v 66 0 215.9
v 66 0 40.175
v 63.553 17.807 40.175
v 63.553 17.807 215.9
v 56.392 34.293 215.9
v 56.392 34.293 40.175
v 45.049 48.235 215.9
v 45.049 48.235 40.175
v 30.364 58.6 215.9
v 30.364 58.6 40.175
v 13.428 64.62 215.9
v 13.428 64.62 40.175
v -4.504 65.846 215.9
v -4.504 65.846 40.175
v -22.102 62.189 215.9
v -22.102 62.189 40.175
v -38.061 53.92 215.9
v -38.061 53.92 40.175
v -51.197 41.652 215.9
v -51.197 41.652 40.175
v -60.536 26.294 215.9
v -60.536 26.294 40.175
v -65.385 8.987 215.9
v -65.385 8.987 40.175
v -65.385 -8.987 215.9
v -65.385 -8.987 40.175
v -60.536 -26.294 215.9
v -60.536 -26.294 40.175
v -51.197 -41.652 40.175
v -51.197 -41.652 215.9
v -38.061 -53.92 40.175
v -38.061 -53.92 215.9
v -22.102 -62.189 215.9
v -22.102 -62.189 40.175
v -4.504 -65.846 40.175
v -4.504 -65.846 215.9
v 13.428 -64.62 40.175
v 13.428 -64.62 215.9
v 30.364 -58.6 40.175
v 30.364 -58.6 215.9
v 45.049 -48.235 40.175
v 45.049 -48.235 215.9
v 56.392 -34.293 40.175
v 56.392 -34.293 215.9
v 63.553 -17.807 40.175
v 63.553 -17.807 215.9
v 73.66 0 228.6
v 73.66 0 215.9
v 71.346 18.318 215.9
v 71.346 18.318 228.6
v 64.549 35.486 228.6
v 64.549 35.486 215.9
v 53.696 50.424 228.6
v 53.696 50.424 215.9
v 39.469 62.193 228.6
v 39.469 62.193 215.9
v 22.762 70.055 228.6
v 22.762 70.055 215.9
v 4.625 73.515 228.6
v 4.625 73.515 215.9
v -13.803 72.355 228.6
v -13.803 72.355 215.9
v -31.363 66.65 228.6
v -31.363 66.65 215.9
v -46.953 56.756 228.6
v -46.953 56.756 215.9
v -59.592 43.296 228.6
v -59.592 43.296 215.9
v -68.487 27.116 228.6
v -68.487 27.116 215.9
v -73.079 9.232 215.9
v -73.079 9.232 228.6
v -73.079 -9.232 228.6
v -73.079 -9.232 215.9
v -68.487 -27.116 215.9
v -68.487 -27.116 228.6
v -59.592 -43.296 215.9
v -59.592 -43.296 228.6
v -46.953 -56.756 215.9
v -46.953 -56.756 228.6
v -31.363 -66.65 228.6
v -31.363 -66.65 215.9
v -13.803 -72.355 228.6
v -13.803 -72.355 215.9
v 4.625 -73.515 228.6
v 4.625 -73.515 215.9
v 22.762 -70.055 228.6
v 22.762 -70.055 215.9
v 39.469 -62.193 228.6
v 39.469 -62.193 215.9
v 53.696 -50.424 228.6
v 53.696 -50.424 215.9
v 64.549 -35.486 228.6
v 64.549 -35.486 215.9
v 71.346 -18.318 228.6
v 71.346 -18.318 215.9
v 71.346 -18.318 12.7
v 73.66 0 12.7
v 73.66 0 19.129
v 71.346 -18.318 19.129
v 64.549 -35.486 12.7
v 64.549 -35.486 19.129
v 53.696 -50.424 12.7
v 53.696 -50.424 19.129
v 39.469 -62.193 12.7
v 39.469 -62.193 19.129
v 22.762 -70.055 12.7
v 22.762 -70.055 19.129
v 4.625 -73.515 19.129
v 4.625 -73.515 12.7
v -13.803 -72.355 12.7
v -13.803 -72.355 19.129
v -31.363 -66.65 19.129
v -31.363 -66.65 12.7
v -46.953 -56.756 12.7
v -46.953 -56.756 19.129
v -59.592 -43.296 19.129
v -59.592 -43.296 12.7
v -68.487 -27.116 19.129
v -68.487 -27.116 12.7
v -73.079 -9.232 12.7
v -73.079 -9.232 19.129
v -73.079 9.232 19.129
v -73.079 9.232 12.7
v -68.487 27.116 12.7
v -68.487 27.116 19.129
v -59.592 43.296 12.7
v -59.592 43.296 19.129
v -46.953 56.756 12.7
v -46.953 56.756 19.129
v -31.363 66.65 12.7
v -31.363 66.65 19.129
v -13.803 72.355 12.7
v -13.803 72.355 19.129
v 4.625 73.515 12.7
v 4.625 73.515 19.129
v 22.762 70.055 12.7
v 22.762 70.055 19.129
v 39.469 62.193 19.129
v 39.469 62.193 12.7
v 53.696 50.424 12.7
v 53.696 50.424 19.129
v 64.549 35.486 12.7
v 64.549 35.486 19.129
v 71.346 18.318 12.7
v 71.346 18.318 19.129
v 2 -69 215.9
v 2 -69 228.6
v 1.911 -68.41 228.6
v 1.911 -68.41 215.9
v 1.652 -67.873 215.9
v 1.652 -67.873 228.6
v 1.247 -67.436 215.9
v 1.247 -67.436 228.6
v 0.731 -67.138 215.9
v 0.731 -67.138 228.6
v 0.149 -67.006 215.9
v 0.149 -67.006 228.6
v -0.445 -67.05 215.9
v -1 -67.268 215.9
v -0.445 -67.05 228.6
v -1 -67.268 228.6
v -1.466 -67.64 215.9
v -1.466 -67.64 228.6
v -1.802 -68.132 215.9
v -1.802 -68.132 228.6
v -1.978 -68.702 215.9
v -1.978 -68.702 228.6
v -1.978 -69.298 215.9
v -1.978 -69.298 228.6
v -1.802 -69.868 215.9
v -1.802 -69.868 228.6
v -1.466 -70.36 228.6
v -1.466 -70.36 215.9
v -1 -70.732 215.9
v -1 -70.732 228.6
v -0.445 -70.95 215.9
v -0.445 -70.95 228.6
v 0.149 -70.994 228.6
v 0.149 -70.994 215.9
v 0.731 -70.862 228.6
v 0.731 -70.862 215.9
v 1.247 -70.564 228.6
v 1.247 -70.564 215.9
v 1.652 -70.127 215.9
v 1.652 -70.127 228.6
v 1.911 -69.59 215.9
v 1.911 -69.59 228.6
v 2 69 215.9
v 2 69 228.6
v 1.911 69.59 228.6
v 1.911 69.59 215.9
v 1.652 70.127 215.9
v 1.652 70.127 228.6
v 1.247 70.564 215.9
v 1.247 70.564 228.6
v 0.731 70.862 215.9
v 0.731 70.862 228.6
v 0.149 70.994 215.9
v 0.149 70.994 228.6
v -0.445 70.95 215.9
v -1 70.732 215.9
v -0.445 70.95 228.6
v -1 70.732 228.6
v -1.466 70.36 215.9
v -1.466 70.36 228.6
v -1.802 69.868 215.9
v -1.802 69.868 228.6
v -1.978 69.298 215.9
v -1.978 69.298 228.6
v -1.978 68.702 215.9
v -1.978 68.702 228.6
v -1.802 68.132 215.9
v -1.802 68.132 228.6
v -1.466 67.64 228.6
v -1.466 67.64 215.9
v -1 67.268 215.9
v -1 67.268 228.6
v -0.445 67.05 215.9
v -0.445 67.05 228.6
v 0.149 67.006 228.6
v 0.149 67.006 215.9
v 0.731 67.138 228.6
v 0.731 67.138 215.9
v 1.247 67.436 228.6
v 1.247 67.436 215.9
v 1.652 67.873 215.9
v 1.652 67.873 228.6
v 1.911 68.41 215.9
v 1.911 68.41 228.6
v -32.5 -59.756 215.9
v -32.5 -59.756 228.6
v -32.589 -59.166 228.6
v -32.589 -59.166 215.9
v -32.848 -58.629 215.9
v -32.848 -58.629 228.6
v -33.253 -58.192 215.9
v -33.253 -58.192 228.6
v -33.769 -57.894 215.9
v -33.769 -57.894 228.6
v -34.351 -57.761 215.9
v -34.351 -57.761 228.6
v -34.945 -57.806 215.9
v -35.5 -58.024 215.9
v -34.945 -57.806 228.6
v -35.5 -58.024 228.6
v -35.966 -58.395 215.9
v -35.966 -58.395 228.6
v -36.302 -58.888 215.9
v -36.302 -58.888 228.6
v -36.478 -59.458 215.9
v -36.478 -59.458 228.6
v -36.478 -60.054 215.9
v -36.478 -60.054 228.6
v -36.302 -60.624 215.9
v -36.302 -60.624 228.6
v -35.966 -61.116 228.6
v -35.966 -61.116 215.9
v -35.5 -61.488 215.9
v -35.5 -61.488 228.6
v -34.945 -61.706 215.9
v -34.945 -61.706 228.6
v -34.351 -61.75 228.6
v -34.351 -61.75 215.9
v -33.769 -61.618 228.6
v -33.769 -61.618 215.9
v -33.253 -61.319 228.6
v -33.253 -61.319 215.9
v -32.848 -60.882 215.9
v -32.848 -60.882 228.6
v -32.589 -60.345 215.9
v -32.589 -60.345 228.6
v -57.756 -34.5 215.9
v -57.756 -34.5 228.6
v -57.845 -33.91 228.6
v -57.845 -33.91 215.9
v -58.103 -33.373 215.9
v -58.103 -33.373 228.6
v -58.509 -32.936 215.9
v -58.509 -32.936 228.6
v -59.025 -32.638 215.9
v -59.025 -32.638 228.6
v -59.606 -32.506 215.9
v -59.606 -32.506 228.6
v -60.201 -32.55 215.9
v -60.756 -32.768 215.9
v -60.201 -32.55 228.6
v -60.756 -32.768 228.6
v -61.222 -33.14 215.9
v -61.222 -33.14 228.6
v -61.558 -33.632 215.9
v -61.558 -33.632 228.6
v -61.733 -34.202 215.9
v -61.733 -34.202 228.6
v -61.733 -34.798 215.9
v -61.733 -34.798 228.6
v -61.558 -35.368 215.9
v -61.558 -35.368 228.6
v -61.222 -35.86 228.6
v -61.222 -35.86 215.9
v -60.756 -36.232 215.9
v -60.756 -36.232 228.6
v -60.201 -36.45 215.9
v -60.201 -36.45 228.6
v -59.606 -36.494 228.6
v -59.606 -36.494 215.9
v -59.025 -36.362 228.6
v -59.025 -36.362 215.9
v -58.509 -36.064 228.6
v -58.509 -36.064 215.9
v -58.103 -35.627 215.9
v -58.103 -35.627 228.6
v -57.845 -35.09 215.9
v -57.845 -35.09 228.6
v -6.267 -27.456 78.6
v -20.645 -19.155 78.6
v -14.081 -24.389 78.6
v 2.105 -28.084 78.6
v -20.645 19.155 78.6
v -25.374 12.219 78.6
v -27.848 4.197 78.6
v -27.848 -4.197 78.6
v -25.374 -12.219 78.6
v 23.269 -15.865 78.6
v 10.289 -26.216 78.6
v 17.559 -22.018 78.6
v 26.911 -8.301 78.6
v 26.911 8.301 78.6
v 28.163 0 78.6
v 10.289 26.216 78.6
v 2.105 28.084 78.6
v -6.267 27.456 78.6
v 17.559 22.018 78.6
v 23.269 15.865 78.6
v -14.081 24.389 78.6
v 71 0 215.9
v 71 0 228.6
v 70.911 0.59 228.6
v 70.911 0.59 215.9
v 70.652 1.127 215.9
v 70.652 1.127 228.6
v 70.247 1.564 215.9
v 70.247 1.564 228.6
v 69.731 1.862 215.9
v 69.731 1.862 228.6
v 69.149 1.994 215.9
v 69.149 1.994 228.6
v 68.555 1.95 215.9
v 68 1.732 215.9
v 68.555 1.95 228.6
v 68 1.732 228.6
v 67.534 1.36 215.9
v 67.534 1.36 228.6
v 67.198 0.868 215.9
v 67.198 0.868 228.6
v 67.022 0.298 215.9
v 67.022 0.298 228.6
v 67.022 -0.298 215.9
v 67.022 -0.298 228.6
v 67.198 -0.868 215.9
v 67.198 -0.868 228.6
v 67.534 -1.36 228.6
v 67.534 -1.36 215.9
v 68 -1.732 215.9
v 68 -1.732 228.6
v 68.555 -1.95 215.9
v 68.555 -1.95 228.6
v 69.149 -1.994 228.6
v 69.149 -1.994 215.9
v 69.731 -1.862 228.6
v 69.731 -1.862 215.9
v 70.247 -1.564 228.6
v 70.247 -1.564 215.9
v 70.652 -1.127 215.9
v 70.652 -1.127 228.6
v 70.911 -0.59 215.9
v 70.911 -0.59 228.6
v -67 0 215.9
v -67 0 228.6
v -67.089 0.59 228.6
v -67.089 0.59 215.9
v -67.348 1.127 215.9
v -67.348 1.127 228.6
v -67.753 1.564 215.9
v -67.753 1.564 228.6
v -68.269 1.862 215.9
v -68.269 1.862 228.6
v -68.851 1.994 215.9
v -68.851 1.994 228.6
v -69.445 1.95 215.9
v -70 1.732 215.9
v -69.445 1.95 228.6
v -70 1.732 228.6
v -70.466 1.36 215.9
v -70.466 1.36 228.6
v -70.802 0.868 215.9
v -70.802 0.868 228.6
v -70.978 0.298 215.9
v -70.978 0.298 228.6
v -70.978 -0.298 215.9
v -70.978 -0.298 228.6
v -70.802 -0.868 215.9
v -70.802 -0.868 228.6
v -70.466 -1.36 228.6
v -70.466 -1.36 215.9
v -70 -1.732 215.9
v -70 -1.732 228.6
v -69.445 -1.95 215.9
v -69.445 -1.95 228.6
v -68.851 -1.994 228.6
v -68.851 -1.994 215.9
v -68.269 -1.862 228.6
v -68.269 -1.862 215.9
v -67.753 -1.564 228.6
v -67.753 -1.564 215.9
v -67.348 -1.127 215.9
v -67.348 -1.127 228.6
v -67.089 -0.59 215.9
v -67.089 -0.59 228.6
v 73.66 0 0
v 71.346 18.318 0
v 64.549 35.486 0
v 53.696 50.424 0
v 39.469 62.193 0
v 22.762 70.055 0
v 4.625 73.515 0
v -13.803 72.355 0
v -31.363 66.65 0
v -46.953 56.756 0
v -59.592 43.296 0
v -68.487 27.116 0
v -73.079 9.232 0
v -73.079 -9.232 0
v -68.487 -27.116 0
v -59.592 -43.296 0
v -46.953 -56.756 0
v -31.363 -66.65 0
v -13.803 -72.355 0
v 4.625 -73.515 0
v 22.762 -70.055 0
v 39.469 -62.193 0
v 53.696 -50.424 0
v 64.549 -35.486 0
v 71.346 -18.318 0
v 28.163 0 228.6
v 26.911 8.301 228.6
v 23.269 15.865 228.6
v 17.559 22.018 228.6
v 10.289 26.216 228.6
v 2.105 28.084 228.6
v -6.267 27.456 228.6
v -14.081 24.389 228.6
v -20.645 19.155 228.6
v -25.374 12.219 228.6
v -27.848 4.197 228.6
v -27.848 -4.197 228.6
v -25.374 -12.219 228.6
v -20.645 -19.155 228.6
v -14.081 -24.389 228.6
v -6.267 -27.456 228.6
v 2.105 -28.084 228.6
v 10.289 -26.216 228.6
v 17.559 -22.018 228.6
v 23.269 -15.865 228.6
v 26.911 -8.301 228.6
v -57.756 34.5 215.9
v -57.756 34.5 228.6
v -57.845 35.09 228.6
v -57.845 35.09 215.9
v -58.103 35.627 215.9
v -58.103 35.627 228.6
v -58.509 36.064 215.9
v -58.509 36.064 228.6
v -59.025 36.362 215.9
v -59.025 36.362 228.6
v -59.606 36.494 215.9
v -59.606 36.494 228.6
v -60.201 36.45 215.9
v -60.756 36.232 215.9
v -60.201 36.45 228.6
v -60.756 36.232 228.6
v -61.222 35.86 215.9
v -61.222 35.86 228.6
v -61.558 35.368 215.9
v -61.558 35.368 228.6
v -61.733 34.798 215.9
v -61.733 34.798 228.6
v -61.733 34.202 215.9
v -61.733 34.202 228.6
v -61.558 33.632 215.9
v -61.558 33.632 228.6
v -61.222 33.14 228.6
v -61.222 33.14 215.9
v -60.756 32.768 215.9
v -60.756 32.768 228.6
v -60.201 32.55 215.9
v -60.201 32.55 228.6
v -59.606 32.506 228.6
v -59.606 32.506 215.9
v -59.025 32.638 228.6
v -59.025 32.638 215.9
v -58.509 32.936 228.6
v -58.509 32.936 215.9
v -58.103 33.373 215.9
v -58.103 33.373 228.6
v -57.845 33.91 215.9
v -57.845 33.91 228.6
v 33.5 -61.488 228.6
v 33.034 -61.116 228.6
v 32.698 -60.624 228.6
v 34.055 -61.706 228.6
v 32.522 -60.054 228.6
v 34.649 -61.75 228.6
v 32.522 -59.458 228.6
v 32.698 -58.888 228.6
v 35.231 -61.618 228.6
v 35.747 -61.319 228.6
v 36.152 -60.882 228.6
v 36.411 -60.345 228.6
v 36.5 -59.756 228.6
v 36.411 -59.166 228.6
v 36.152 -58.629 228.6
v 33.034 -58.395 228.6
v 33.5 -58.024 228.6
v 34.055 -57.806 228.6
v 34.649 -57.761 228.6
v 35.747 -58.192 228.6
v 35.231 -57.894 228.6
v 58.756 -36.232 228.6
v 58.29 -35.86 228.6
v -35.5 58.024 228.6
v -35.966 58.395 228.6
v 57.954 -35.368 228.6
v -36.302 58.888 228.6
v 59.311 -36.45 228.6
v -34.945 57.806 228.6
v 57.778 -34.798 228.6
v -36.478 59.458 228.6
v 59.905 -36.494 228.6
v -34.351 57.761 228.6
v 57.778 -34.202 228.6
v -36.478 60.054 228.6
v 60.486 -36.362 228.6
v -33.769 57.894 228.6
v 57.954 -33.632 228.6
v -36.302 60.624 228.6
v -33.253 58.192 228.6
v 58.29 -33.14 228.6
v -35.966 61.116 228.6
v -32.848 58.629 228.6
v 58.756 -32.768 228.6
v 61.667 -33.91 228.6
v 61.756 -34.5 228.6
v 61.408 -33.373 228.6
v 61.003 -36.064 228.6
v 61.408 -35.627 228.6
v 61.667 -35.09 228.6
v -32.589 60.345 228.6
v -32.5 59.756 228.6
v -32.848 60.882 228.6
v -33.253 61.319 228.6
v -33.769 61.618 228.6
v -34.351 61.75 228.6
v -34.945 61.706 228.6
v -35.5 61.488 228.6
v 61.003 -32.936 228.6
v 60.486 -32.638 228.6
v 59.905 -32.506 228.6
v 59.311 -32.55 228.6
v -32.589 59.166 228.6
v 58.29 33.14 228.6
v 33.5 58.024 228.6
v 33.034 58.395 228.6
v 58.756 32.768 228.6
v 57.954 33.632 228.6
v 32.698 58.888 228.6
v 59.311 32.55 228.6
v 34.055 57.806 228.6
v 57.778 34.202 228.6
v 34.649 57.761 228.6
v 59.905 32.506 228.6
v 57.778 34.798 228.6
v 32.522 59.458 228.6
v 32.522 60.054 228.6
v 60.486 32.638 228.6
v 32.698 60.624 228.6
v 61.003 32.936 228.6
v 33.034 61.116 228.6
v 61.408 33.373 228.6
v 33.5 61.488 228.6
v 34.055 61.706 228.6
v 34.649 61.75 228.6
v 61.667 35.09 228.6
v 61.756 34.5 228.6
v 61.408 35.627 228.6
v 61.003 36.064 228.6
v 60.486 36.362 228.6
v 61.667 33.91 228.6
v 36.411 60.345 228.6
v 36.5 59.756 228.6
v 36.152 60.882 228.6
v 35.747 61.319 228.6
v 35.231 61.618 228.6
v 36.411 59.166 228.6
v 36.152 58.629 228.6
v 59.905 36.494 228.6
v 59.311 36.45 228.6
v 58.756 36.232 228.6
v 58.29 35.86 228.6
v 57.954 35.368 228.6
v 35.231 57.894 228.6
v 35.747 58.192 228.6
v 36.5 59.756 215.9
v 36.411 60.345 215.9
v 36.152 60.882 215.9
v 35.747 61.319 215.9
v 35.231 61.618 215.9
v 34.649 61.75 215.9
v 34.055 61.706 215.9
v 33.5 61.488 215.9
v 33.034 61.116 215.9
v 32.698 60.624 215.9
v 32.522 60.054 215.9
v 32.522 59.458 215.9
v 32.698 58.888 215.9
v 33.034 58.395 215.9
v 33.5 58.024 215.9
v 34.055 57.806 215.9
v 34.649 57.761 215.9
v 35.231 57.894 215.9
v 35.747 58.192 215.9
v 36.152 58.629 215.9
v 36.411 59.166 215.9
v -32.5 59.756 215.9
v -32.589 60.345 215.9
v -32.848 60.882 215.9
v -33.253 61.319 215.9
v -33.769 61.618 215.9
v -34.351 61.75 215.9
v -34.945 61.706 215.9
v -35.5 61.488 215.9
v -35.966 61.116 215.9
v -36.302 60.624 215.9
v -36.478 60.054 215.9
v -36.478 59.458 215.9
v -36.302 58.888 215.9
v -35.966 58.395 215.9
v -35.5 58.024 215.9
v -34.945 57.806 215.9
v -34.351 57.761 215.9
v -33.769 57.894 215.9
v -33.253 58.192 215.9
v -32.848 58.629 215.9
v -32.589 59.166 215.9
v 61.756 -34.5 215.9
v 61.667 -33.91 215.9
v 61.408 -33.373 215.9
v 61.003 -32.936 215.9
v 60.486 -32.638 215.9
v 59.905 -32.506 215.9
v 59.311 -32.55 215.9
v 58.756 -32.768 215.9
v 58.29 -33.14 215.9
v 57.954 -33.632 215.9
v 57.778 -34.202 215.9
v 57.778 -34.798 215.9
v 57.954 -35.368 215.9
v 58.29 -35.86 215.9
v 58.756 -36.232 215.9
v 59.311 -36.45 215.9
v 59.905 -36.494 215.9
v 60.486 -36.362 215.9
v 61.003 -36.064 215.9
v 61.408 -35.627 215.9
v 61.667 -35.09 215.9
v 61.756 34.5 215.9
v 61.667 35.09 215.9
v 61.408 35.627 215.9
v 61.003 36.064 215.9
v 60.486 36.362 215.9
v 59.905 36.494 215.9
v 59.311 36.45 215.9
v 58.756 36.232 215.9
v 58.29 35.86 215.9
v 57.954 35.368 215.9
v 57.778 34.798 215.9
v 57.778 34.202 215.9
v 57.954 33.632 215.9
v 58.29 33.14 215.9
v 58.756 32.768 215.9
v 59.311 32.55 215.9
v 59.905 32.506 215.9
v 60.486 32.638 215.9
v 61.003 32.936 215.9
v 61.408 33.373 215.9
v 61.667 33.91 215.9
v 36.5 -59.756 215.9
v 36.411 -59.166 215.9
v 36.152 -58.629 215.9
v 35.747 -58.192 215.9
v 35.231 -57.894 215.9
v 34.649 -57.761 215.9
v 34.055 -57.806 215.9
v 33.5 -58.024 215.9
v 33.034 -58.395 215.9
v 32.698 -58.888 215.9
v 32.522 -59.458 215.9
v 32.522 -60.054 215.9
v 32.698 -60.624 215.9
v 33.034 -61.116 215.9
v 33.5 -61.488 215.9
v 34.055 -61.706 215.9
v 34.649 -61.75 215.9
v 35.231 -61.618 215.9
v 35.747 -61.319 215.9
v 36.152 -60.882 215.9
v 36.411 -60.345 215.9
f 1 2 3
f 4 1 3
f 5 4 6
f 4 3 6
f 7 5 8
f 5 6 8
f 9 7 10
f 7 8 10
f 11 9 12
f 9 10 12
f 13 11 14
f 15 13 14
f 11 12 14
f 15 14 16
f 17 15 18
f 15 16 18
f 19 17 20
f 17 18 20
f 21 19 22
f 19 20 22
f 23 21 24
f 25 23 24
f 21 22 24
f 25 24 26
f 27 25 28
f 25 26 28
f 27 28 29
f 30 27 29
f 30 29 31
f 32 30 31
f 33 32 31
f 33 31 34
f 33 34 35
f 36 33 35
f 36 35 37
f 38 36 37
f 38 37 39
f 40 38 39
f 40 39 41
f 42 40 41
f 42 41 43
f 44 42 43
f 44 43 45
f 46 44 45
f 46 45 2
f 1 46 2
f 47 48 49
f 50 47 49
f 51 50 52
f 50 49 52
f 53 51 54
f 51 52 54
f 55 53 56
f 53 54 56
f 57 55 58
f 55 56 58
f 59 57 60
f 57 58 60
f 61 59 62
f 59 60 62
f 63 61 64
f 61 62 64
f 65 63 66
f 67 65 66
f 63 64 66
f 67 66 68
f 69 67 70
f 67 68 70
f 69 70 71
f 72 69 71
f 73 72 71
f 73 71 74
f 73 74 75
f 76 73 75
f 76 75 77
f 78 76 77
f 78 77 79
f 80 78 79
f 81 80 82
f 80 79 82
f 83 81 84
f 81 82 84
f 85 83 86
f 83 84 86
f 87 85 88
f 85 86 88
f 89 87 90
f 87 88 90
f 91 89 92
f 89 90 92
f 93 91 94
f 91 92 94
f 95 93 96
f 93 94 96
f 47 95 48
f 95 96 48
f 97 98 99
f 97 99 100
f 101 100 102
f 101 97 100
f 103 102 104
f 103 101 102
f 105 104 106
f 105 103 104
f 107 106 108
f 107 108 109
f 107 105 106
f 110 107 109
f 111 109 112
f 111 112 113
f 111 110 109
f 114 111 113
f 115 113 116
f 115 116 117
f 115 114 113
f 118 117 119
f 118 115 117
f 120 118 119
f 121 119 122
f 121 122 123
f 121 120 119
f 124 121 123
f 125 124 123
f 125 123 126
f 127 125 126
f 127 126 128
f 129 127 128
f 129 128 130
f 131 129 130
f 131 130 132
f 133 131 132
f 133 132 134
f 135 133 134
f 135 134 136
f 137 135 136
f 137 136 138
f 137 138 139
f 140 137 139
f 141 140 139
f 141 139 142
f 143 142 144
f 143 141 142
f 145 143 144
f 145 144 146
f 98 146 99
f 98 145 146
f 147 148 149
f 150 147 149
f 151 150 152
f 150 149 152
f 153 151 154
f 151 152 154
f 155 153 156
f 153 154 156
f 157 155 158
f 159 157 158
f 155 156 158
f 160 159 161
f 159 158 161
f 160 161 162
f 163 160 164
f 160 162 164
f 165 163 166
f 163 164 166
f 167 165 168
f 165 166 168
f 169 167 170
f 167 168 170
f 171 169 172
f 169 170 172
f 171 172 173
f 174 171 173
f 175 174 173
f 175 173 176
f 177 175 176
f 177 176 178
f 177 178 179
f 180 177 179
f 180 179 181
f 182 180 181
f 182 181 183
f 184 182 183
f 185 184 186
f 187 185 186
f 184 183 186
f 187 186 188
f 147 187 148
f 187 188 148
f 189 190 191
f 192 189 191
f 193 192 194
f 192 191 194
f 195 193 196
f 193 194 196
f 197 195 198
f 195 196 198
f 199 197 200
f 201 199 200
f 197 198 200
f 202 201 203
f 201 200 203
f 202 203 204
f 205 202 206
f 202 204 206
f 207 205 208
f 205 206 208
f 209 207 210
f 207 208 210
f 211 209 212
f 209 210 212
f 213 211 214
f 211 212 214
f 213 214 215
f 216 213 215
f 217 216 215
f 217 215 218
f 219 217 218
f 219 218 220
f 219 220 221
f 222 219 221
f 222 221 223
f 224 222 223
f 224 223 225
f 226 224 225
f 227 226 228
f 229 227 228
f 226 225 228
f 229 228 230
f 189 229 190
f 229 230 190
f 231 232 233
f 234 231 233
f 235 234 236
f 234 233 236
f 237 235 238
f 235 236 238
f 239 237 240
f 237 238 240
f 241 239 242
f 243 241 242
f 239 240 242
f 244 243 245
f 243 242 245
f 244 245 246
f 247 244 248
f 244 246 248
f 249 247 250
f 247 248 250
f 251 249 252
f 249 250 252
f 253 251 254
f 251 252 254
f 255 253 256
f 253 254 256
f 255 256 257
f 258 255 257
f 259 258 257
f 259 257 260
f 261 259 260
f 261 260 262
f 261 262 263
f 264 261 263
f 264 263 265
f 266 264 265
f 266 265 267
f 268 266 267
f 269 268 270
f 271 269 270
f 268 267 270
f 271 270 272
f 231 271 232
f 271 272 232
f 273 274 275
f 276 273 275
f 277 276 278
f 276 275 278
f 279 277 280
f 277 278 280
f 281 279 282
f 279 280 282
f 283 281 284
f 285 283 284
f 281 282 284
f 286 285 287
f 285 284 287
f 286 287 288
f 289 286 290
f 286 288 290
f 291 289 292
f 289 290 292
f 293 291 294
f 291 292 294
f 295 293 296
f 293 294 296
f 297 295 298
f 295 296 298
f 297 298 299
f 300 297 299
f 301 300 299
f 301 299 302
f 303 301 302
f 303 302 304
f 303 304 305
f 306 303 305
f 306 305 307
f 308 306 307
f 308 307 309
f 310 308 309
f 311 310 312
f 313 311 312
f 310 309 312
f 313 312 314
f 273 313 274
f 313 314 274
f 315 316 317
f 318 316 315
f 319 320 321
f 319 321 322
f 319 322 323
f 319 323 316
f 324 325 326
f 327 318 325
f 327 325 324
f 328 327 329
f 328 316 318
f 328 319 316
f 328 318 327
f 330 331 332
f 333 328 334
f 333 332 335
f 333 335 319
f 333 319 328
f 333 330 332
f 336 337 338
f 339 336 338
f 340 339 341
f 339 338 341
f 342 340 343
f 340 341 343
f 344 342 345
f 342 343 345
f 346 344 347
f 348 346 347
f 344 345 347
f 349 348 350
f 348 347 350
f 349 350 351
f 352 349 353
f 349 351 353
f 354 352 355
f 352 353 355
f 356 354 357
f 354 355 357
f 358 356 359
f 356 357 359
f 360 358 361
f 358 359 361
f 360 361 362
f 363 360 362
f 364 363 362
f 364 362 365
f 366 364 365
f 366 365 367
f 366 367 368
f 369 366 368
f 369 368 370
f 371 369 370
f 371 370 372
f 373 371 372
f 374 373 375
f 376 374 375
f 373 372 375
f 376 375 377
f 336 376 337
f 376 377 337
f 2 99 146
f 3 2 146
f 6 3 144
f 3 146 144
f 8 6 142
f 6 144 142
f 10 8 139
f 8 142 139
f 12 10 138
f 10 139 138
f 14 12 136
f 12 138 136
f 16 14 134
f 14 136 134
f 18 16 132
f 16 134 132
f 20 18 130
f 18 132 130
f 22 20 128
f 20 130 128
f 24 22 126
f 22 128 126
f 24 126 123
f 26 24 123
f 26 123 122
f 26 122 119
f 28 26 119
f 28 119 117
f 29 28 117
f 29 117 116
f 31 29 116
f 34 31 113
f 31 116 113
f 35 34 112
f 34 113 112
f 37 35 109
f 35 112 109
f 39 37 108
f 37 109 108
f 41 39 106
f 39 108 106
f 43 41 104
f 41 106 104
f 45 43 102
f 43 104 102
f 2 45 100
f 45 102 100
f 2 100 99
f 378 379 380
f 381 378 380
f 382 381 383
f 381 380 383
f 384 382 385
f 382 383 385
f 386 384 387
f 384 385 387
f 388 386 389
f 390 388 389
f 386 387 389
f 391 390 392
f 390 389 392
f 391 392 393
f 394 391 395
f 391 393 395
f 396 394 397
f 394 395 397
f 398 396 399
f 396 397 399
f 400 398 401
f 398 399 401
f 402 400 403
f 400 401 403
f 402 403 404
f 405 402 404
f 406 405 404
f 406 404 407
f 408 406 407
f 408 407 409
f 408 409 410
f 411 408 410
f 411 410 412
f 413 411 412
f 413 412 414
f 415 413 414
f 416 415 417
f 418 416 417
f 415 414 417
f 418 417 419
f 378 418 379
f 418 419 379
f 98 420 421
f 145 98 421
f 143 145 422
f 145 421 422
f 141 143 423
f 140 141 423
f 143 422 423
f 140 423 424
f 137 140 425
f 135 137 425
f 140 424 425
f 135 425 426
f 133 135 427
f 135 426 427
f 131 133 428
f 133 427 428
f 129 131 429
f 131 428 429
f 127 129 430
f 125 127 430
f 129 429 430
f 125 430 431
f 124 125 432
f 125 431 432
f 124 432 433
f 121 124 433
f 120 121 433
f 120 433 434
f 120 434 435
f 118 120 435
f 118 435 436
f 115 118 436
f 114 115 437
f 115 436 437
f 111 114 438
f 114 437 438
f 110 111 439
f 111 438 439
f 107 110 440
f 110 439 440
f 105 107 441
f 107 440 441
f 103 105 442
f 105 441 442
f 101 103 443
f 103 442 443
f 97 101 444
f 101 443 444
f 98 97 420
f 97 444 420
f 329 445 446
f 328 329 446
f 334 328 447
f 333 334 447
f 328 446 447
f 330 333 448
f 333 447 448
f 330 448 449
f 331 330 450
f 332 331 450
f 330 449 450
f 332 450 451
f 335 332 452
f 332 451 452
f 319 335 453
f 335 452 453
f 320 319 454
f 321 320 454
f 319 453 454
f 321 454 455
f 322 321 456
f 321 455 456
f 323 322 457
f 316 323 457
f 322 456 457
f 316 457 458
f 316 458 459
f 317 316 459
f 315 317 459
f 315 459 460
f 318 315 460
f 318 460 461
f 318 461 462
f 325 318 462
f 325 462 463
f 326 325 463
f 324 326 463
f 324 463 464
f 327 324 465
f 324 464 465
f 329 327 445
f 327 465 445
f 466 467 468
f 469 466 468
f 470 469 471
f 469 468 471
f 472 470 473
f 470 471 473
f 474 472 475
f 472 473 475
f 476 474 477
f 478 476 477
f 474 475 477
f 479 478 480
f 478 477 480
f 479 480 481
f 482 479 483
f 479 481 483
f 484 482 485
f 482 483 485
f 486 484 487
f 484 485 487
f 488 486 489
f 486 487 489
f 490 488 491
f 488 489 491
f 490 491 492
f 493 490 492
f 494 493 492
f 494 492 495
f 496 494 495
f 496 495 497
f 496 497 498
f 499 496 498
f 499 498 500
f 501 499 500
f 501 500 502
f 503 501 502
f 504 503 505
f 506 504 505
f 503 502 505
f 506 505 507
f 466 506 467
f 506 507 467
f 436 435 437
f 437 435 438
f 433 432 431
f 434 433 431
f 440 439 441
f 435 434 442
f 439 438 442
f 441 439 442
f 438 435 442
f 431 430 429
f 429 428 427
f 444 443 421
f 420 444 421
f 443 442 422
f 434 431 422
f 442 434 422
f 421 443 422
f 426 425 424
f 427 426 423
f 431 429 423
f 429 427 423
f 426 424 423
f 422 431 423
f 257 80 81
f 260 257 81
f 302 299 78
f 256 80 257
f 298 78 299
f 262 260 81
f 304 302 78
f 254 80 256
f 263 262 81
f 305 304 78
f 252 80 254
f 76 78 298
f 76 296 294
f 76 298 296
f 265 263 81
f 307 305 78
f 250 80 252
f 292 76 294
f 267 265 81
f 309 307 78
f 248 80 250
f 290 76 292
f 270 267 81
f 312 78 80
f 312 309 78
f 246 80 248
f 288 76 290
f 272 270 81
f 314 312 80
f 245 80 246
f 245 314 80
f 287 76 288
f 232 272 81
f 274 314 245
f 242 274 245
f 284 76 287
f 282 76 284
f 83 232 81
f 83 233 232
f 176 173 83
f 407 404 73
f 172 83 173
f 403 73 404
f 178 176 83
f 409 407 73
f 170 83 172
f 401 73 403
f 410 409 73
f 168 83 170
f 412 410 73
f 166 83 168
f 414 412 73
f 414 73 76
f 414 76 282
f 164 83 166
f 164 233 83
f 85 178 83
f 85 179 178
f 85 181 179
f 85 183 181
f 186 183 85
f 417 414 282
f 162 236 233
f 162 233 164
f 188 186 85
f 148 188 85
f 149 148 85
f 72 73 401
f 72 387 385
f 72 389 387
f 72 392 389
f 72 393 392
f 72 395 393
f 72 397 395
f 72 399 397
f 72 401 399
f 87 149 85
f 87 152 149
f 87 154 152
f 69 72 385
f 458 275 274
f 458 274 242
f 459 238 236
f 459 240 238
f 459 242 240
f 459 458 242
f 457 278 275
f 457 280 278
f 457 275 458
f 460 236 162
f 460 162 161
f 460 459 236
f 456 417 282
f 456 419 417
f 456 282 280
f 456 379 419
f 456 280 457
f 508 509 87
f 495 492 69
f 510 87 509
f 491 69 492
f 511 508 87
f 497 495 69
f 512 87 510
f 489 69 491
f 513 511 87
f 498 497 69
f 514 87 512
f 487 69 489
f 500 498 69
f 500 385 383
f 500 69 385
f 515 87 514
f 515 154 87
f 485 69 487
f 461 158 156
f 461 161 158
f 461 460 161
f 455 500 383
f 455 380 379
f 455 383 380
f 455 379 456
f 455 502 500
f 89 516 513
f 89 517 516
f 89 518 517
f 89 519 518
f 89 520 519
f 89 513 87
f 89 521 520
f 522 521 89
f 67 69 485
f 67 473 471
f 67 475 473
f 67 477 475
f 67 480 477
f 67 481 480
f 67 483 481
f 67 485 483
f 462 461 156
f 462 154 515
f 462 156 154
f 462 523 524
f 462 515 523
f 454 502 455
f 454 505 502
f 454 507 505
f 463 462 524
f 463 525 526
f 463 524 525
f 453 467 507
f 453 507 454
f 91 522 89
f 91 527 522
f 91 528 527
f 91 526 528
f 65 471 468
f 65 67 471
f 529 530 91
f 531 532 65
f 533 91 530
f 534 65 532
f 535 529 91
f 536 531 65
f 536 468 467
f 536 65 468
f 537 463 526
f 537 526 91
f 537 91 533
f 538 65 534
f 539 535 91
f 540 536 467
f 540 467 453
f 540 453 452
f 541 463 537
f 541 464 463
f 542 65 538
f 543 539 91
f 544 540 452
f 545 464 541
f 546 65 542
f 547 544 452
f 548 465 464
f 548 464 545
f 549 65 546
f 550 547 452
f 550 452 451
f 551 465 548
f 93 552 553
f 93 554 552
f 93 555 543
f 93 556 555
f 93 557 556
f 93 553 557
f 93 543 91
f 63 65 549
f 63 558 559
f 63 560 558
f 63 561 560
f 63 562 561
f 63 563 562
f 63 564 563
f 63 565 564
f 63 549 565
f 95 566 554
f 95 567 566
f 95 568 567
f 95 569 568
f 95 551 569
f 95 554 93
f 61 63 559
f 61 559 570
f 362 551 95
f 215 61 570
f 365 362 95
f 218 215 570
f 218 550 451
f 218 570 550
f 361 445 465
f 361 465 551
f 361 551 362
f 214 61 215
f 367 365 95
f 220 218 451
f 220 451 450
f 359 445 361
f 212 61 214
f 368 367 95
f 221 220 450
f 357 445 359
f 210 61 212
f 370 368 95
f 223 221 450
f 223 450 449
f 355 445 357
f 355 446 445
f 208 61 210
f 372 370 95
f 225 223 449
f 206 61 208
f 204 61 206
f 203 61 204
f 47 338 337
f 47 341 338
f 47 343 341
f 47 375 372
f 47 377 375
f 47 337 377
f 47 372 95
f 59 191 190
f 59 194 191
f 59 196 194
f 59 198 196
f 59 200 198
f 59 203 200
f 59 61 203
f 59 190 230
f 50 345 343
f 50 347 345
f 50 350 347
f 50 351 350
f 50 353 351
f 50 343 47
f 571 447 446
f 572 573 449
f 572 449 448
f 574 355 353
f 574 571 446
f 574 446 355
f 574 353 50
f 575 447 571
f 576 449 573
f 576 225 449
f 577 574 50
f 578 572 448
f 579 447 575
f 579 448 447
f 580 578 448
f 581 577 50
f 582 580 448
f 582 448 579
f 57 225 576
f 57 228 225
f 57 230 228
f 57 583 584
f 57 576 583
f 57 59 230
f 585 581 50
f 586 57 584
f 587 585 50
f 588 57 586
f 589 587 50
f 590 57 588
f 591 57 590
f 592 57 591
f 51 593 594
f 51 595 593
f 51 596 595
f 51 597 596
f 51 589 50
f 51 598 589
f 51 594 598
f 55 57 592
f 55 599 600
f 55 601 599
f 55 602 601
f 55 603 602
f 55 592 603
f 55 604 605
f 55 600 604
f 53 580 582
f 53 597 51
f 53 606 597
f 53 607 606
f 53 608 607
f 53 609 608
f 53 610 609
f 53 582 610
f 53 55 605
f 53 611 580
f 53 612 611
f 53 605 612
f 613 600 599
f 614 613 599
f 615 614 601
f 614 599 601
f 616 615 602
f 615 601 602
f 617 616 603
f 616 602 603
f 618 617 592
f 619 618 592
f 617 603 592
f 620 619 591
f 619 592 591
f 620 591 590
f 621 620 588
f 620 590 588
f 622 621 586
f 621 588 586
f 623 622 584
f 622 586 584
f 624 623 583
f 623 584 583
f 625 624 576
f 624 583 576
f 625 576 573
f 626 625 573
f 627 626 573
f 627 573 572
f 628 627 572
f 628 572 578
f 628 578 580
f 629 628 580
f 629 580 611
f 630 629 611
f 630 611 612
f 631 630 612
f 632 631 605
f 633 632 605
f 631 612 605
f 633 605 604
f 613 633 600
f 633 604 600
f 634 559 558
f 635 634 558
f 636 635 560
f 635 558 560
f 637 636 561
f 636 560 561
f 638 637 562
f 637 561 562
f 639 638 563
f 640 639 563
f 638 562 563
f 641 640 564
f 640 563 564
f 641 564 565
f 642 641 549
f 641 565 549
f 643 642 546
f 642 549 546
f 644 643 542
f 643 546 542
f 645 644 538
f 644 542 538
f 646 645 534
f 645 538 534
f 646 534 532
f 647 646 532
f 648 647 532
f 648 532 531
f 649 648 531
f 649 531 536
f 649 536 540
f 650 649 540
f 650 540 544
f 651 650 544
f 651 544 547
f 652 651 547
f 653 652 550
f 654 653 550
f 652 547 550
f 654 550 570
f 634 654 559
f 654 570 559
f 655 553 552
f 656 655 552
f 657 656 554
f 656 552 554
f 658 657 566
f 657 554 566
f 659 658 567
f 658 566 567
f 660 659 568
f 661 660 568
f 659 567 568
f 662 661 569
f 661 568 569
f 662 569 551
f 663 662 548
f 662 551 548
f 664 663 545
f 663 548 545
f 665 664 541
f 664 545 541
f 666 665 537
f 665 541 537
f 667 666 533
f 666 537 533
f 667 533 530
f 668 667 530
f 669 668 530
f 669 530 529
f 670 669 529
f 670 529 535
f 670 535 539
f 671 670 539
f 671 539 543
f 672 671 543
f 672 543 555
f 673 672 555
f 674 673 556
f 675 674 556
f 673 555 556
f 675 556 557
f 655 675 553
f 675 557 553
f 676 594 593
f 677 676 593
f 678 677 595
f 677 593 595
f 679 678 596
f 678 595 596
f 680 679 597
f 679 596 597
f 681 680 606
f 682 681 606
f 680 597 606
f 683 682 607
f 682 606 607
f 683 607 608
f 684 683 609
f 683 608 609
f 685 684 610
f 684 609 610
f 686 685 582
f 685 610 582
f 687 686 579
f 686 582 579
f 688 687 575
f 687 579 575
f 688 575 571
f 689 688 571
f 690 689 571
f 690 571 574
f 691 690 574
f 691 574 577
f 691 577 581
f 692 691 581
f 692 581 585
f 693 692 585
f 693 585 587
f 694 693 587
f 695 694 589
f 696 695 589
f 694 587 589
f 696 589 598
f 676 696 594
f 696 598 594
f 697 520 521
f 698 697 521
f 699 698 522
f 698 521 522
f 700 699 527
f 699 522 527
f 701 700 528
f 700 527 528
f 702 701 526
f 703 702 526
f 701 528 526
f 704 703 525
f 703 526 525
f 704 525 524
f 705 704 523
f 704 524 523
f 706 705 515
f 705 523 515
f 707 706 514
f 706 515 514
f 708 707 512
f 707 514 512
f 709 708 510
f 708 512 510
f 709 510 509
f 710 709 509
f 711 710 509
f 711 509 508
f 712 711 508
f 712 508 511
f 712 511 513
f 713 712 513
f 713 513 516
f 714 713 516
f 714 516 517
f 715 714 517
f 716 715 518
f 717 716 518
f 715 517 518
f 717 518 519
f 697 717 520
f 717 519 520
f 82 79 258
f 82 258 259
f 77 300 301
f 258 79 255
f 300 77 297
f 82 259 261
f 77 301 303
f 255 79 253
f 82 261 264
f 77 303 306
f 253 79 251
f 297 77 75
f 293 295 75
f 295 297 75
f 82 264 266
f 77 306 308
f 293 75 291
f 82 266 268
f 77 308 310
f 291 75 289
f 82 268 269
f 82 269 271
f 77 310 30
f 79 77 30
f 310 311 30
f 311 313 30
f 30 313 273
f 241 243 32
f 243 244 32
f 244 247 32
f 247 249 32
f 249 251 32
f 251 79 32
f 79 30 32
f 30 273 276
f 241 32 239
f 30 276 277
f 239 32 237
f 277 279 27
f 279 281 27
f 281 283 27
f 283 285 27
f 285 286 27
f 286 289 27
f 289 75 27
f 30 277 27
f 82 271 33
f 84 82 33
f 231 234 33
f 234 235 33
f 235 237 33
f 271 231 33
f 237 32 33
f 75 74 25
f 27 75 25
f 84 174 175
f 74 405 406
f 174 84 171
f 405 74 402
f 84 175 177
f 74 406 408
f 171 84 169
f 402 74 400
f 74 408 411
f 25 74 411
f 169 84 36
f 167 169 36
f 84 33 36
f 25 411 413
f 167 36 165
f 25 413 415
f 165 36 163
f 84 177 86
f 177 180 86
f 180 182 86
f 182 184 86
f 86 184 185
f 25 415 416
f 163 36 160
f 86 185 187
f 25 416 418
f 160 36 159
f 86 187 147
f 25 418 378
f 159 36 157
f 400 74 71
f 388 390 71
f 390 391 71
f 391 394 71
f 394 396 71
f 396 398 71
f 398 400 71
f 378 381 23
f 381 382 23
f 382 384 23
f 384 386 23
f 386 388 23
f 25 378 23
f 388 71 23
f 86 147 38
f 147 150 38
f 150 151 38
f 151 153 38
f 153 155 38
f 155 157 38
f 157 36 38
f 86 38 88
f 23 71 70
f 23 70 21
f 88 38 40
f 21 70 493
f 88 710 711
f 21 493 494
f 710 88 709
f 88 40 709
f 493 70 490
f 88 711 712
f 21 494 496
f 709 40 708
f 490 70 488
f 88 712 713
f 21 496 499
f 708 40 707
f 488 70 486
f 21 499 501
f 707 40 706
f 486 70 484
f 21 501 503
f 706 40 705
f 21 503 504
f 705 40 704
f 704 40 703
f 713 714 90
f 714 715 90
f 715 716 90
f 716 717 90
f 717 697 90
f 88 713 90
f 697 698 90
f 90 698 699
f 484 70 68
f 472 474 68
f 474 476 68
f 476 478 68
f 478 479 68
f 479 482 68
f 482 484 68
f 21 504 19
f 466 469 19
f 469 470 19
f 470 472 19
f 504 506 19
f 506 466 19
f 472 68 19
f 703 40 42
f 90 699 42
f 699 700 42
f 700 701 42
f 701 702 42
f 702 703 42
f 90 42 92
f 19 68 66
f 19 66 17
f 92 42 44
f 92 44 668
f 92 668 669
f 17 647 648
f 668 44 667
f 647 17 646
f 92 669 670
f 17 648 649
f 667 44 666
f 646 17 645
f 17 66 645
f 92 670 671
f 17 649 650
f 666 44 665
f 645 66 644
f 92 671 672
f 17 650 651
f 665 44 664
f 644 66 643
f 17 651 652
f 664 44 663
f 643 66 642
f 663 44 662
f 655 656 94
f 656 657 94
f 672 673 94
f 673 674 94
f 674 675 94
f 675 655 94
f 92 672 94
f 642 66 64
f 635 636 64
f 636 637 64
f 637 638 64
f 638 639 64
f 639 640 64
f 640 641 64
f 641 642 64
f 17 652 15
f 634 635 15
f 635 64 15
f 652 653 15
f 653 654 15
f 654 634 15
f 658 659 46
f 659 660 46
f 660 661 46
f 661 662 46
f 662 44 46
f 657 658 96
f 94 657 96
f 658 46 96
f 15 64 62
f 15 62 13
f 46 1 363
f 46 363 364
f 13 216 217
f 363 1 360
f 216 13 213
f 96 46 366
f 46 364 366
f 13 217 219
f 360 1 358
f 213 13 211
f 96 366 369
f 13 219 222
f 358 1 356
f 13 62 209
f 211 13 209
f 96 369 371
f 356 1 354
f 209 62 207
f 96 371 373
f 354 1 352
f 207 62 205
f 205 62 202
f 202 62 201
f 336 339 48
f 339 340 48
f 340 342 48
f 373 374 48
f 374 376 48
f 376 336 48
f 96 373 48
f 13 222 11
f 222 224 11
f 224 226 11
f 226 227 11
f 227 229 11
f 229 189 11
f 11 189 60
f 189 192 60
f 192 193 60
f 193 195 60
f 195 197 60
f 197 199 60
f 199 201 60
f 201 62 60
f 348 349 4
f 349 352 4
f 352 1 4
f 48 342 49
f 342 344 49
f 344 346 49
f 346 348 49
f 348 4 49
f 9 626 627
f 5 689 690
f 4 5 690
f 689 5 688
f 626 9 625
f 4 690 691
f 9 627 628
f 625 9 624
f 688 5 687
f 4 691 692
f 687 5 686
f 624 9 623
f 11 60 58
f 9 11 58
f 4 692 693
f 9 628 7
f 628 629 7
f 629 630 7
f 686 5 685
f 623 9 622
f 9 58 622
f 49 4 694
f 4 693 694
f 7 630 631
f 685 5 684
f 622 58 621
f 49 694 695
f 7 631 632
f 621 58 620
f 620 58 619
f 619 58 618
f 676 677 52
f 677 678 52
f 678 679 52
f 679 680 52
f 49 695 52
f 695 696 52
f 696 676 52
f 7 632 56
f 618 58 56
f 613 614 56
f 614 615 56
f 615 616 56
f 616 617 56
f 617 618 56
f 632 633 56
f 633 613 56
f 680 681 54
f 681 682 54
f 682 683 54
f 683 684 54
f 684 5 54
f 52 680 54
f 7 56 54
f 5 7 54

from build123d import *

# Parameters (mm, degrees)
SKETCH2_R           = 73.66
BOSS_EXTRUDE1_DEPTH = 12.7
SKETCH3_R           = 66
BOSS_EXTRUDE2_DEPTH = 203.2
SKETCH4_R           = 73.66
BOSS_EXTRUDE3_DEPTH = 12.7
SKETCH6_R           = 2
CUT_EXTRUDE1_DEPTH  = 12.7
CHAMFER1_SIZE       = 27.474774195
CHAMFER1_SIZE_2     = 10
SKETCH8_R           = 28.1625529
CUT_EXTRUDE2_DEPTH  = 150


with BuildPart() as part:
    # Sketch2 → Boss-Extrude1 (new body)
    with BuildSketch(Plane.XY):
        Circle(SKETCH2_R)
    extrude(amount=BOSS_EXTRUDE1_DEPTH)

    # Sketch3 → Boss-Extrude2 (add)
    with BuildSketch(Plane.XY.offset(12.7)):
        Circle(SKETCH3_R)
    extrude(amount=BOSS_EXTRUDE2_DEPTH)

    # Sketch4 → Boss-Extrude3 (add)
    with BuildSketch(Plane.XY.offset(215.9)):
        Circle(SKETCH4_R)
    extrude(amount=BOSS_EXTRUDE3_DEPTH)

    # Sketch6 → Cut-Extrude1 (cut)
    with BuildSketch(Plane.XY.offset(228.6)):
        with Locations((0, 69)):
            Circle(SKETCH6_R)
        with Locations((34.5, 59.755752861)):
            Circle(SKETCH6_R)
        with Locations((59.755752861, 34.5)):
            Circle(SKETCH6_R)
        with Locations((69, 0)):
            Circle(SKETCH6_R)
        with Locations((59.755752861, -34.5)):
            Circle(SKETCH6_R)
        with Locations((34.5, -59.755752861)):
            Circle(SKETCH6_R)
        with Locations((0, -69)):
            Circle(SKETCH6_R)
        with Locations((-34.5, -59.755752861)):
            Circle(SKETCH6_R)
        with Locations((-59.755752861, -34.5)):
            Circle(SKETCH6_R)
        with Locations((-69, 0)):
            Circle(SKETCH6_R)
        with Locations((-59.755752861, 34.5)):
            Circle(SKETCH6_R)
        with Locations((-34.5, 59.755752861)):
            Circle(SKETCH6_R)
    extrude(amount=-CUT_EXTRUDE1_DEPTH, mode=Mode.SUBTRACT)

    # Chamfer1
    # the kernel refuses this chamfer: 27.474774195, 10 mm, written as the material it adds along each edge
    with BuildSketch(Plane(origin=(0, 0, 12.7), x_dir=(1, 0, 0), z_dir=(0, -1, 0))) as chamfer1_piece_1_section:
        Polygon((66, CHAMFER1_SIZE), (66 + CHAMFER1_SIZE_2, 0), (66, 0), align=None)
    chamfer1_piece_1 = revolve(axis=Axis((0, 0, 12.7), (0, 0, 1)), mode=Mode.PRIVATE)
    chamfer1_piece_1 = chamfer1_piece_1 & Plane(origin=(0, 0, 30.030529596), x_dir=(1, 0, 0), z_dir=(0, 0, -1)) * Cylinder(73.66, 304, mode=Mode.PRIVATE)
    add(chamfer1_piece_1)

    # Sketch8 → Cut-Extrude2 (cut)
    with BuildSketch(Plane.XY.offset(228.6)):
        Circle(SKETCH8_R)
    extrude(amount=-CUT_EXTRUDE2_DEPTH, mode=Mode.SUBTRACT)


solid = part.part
